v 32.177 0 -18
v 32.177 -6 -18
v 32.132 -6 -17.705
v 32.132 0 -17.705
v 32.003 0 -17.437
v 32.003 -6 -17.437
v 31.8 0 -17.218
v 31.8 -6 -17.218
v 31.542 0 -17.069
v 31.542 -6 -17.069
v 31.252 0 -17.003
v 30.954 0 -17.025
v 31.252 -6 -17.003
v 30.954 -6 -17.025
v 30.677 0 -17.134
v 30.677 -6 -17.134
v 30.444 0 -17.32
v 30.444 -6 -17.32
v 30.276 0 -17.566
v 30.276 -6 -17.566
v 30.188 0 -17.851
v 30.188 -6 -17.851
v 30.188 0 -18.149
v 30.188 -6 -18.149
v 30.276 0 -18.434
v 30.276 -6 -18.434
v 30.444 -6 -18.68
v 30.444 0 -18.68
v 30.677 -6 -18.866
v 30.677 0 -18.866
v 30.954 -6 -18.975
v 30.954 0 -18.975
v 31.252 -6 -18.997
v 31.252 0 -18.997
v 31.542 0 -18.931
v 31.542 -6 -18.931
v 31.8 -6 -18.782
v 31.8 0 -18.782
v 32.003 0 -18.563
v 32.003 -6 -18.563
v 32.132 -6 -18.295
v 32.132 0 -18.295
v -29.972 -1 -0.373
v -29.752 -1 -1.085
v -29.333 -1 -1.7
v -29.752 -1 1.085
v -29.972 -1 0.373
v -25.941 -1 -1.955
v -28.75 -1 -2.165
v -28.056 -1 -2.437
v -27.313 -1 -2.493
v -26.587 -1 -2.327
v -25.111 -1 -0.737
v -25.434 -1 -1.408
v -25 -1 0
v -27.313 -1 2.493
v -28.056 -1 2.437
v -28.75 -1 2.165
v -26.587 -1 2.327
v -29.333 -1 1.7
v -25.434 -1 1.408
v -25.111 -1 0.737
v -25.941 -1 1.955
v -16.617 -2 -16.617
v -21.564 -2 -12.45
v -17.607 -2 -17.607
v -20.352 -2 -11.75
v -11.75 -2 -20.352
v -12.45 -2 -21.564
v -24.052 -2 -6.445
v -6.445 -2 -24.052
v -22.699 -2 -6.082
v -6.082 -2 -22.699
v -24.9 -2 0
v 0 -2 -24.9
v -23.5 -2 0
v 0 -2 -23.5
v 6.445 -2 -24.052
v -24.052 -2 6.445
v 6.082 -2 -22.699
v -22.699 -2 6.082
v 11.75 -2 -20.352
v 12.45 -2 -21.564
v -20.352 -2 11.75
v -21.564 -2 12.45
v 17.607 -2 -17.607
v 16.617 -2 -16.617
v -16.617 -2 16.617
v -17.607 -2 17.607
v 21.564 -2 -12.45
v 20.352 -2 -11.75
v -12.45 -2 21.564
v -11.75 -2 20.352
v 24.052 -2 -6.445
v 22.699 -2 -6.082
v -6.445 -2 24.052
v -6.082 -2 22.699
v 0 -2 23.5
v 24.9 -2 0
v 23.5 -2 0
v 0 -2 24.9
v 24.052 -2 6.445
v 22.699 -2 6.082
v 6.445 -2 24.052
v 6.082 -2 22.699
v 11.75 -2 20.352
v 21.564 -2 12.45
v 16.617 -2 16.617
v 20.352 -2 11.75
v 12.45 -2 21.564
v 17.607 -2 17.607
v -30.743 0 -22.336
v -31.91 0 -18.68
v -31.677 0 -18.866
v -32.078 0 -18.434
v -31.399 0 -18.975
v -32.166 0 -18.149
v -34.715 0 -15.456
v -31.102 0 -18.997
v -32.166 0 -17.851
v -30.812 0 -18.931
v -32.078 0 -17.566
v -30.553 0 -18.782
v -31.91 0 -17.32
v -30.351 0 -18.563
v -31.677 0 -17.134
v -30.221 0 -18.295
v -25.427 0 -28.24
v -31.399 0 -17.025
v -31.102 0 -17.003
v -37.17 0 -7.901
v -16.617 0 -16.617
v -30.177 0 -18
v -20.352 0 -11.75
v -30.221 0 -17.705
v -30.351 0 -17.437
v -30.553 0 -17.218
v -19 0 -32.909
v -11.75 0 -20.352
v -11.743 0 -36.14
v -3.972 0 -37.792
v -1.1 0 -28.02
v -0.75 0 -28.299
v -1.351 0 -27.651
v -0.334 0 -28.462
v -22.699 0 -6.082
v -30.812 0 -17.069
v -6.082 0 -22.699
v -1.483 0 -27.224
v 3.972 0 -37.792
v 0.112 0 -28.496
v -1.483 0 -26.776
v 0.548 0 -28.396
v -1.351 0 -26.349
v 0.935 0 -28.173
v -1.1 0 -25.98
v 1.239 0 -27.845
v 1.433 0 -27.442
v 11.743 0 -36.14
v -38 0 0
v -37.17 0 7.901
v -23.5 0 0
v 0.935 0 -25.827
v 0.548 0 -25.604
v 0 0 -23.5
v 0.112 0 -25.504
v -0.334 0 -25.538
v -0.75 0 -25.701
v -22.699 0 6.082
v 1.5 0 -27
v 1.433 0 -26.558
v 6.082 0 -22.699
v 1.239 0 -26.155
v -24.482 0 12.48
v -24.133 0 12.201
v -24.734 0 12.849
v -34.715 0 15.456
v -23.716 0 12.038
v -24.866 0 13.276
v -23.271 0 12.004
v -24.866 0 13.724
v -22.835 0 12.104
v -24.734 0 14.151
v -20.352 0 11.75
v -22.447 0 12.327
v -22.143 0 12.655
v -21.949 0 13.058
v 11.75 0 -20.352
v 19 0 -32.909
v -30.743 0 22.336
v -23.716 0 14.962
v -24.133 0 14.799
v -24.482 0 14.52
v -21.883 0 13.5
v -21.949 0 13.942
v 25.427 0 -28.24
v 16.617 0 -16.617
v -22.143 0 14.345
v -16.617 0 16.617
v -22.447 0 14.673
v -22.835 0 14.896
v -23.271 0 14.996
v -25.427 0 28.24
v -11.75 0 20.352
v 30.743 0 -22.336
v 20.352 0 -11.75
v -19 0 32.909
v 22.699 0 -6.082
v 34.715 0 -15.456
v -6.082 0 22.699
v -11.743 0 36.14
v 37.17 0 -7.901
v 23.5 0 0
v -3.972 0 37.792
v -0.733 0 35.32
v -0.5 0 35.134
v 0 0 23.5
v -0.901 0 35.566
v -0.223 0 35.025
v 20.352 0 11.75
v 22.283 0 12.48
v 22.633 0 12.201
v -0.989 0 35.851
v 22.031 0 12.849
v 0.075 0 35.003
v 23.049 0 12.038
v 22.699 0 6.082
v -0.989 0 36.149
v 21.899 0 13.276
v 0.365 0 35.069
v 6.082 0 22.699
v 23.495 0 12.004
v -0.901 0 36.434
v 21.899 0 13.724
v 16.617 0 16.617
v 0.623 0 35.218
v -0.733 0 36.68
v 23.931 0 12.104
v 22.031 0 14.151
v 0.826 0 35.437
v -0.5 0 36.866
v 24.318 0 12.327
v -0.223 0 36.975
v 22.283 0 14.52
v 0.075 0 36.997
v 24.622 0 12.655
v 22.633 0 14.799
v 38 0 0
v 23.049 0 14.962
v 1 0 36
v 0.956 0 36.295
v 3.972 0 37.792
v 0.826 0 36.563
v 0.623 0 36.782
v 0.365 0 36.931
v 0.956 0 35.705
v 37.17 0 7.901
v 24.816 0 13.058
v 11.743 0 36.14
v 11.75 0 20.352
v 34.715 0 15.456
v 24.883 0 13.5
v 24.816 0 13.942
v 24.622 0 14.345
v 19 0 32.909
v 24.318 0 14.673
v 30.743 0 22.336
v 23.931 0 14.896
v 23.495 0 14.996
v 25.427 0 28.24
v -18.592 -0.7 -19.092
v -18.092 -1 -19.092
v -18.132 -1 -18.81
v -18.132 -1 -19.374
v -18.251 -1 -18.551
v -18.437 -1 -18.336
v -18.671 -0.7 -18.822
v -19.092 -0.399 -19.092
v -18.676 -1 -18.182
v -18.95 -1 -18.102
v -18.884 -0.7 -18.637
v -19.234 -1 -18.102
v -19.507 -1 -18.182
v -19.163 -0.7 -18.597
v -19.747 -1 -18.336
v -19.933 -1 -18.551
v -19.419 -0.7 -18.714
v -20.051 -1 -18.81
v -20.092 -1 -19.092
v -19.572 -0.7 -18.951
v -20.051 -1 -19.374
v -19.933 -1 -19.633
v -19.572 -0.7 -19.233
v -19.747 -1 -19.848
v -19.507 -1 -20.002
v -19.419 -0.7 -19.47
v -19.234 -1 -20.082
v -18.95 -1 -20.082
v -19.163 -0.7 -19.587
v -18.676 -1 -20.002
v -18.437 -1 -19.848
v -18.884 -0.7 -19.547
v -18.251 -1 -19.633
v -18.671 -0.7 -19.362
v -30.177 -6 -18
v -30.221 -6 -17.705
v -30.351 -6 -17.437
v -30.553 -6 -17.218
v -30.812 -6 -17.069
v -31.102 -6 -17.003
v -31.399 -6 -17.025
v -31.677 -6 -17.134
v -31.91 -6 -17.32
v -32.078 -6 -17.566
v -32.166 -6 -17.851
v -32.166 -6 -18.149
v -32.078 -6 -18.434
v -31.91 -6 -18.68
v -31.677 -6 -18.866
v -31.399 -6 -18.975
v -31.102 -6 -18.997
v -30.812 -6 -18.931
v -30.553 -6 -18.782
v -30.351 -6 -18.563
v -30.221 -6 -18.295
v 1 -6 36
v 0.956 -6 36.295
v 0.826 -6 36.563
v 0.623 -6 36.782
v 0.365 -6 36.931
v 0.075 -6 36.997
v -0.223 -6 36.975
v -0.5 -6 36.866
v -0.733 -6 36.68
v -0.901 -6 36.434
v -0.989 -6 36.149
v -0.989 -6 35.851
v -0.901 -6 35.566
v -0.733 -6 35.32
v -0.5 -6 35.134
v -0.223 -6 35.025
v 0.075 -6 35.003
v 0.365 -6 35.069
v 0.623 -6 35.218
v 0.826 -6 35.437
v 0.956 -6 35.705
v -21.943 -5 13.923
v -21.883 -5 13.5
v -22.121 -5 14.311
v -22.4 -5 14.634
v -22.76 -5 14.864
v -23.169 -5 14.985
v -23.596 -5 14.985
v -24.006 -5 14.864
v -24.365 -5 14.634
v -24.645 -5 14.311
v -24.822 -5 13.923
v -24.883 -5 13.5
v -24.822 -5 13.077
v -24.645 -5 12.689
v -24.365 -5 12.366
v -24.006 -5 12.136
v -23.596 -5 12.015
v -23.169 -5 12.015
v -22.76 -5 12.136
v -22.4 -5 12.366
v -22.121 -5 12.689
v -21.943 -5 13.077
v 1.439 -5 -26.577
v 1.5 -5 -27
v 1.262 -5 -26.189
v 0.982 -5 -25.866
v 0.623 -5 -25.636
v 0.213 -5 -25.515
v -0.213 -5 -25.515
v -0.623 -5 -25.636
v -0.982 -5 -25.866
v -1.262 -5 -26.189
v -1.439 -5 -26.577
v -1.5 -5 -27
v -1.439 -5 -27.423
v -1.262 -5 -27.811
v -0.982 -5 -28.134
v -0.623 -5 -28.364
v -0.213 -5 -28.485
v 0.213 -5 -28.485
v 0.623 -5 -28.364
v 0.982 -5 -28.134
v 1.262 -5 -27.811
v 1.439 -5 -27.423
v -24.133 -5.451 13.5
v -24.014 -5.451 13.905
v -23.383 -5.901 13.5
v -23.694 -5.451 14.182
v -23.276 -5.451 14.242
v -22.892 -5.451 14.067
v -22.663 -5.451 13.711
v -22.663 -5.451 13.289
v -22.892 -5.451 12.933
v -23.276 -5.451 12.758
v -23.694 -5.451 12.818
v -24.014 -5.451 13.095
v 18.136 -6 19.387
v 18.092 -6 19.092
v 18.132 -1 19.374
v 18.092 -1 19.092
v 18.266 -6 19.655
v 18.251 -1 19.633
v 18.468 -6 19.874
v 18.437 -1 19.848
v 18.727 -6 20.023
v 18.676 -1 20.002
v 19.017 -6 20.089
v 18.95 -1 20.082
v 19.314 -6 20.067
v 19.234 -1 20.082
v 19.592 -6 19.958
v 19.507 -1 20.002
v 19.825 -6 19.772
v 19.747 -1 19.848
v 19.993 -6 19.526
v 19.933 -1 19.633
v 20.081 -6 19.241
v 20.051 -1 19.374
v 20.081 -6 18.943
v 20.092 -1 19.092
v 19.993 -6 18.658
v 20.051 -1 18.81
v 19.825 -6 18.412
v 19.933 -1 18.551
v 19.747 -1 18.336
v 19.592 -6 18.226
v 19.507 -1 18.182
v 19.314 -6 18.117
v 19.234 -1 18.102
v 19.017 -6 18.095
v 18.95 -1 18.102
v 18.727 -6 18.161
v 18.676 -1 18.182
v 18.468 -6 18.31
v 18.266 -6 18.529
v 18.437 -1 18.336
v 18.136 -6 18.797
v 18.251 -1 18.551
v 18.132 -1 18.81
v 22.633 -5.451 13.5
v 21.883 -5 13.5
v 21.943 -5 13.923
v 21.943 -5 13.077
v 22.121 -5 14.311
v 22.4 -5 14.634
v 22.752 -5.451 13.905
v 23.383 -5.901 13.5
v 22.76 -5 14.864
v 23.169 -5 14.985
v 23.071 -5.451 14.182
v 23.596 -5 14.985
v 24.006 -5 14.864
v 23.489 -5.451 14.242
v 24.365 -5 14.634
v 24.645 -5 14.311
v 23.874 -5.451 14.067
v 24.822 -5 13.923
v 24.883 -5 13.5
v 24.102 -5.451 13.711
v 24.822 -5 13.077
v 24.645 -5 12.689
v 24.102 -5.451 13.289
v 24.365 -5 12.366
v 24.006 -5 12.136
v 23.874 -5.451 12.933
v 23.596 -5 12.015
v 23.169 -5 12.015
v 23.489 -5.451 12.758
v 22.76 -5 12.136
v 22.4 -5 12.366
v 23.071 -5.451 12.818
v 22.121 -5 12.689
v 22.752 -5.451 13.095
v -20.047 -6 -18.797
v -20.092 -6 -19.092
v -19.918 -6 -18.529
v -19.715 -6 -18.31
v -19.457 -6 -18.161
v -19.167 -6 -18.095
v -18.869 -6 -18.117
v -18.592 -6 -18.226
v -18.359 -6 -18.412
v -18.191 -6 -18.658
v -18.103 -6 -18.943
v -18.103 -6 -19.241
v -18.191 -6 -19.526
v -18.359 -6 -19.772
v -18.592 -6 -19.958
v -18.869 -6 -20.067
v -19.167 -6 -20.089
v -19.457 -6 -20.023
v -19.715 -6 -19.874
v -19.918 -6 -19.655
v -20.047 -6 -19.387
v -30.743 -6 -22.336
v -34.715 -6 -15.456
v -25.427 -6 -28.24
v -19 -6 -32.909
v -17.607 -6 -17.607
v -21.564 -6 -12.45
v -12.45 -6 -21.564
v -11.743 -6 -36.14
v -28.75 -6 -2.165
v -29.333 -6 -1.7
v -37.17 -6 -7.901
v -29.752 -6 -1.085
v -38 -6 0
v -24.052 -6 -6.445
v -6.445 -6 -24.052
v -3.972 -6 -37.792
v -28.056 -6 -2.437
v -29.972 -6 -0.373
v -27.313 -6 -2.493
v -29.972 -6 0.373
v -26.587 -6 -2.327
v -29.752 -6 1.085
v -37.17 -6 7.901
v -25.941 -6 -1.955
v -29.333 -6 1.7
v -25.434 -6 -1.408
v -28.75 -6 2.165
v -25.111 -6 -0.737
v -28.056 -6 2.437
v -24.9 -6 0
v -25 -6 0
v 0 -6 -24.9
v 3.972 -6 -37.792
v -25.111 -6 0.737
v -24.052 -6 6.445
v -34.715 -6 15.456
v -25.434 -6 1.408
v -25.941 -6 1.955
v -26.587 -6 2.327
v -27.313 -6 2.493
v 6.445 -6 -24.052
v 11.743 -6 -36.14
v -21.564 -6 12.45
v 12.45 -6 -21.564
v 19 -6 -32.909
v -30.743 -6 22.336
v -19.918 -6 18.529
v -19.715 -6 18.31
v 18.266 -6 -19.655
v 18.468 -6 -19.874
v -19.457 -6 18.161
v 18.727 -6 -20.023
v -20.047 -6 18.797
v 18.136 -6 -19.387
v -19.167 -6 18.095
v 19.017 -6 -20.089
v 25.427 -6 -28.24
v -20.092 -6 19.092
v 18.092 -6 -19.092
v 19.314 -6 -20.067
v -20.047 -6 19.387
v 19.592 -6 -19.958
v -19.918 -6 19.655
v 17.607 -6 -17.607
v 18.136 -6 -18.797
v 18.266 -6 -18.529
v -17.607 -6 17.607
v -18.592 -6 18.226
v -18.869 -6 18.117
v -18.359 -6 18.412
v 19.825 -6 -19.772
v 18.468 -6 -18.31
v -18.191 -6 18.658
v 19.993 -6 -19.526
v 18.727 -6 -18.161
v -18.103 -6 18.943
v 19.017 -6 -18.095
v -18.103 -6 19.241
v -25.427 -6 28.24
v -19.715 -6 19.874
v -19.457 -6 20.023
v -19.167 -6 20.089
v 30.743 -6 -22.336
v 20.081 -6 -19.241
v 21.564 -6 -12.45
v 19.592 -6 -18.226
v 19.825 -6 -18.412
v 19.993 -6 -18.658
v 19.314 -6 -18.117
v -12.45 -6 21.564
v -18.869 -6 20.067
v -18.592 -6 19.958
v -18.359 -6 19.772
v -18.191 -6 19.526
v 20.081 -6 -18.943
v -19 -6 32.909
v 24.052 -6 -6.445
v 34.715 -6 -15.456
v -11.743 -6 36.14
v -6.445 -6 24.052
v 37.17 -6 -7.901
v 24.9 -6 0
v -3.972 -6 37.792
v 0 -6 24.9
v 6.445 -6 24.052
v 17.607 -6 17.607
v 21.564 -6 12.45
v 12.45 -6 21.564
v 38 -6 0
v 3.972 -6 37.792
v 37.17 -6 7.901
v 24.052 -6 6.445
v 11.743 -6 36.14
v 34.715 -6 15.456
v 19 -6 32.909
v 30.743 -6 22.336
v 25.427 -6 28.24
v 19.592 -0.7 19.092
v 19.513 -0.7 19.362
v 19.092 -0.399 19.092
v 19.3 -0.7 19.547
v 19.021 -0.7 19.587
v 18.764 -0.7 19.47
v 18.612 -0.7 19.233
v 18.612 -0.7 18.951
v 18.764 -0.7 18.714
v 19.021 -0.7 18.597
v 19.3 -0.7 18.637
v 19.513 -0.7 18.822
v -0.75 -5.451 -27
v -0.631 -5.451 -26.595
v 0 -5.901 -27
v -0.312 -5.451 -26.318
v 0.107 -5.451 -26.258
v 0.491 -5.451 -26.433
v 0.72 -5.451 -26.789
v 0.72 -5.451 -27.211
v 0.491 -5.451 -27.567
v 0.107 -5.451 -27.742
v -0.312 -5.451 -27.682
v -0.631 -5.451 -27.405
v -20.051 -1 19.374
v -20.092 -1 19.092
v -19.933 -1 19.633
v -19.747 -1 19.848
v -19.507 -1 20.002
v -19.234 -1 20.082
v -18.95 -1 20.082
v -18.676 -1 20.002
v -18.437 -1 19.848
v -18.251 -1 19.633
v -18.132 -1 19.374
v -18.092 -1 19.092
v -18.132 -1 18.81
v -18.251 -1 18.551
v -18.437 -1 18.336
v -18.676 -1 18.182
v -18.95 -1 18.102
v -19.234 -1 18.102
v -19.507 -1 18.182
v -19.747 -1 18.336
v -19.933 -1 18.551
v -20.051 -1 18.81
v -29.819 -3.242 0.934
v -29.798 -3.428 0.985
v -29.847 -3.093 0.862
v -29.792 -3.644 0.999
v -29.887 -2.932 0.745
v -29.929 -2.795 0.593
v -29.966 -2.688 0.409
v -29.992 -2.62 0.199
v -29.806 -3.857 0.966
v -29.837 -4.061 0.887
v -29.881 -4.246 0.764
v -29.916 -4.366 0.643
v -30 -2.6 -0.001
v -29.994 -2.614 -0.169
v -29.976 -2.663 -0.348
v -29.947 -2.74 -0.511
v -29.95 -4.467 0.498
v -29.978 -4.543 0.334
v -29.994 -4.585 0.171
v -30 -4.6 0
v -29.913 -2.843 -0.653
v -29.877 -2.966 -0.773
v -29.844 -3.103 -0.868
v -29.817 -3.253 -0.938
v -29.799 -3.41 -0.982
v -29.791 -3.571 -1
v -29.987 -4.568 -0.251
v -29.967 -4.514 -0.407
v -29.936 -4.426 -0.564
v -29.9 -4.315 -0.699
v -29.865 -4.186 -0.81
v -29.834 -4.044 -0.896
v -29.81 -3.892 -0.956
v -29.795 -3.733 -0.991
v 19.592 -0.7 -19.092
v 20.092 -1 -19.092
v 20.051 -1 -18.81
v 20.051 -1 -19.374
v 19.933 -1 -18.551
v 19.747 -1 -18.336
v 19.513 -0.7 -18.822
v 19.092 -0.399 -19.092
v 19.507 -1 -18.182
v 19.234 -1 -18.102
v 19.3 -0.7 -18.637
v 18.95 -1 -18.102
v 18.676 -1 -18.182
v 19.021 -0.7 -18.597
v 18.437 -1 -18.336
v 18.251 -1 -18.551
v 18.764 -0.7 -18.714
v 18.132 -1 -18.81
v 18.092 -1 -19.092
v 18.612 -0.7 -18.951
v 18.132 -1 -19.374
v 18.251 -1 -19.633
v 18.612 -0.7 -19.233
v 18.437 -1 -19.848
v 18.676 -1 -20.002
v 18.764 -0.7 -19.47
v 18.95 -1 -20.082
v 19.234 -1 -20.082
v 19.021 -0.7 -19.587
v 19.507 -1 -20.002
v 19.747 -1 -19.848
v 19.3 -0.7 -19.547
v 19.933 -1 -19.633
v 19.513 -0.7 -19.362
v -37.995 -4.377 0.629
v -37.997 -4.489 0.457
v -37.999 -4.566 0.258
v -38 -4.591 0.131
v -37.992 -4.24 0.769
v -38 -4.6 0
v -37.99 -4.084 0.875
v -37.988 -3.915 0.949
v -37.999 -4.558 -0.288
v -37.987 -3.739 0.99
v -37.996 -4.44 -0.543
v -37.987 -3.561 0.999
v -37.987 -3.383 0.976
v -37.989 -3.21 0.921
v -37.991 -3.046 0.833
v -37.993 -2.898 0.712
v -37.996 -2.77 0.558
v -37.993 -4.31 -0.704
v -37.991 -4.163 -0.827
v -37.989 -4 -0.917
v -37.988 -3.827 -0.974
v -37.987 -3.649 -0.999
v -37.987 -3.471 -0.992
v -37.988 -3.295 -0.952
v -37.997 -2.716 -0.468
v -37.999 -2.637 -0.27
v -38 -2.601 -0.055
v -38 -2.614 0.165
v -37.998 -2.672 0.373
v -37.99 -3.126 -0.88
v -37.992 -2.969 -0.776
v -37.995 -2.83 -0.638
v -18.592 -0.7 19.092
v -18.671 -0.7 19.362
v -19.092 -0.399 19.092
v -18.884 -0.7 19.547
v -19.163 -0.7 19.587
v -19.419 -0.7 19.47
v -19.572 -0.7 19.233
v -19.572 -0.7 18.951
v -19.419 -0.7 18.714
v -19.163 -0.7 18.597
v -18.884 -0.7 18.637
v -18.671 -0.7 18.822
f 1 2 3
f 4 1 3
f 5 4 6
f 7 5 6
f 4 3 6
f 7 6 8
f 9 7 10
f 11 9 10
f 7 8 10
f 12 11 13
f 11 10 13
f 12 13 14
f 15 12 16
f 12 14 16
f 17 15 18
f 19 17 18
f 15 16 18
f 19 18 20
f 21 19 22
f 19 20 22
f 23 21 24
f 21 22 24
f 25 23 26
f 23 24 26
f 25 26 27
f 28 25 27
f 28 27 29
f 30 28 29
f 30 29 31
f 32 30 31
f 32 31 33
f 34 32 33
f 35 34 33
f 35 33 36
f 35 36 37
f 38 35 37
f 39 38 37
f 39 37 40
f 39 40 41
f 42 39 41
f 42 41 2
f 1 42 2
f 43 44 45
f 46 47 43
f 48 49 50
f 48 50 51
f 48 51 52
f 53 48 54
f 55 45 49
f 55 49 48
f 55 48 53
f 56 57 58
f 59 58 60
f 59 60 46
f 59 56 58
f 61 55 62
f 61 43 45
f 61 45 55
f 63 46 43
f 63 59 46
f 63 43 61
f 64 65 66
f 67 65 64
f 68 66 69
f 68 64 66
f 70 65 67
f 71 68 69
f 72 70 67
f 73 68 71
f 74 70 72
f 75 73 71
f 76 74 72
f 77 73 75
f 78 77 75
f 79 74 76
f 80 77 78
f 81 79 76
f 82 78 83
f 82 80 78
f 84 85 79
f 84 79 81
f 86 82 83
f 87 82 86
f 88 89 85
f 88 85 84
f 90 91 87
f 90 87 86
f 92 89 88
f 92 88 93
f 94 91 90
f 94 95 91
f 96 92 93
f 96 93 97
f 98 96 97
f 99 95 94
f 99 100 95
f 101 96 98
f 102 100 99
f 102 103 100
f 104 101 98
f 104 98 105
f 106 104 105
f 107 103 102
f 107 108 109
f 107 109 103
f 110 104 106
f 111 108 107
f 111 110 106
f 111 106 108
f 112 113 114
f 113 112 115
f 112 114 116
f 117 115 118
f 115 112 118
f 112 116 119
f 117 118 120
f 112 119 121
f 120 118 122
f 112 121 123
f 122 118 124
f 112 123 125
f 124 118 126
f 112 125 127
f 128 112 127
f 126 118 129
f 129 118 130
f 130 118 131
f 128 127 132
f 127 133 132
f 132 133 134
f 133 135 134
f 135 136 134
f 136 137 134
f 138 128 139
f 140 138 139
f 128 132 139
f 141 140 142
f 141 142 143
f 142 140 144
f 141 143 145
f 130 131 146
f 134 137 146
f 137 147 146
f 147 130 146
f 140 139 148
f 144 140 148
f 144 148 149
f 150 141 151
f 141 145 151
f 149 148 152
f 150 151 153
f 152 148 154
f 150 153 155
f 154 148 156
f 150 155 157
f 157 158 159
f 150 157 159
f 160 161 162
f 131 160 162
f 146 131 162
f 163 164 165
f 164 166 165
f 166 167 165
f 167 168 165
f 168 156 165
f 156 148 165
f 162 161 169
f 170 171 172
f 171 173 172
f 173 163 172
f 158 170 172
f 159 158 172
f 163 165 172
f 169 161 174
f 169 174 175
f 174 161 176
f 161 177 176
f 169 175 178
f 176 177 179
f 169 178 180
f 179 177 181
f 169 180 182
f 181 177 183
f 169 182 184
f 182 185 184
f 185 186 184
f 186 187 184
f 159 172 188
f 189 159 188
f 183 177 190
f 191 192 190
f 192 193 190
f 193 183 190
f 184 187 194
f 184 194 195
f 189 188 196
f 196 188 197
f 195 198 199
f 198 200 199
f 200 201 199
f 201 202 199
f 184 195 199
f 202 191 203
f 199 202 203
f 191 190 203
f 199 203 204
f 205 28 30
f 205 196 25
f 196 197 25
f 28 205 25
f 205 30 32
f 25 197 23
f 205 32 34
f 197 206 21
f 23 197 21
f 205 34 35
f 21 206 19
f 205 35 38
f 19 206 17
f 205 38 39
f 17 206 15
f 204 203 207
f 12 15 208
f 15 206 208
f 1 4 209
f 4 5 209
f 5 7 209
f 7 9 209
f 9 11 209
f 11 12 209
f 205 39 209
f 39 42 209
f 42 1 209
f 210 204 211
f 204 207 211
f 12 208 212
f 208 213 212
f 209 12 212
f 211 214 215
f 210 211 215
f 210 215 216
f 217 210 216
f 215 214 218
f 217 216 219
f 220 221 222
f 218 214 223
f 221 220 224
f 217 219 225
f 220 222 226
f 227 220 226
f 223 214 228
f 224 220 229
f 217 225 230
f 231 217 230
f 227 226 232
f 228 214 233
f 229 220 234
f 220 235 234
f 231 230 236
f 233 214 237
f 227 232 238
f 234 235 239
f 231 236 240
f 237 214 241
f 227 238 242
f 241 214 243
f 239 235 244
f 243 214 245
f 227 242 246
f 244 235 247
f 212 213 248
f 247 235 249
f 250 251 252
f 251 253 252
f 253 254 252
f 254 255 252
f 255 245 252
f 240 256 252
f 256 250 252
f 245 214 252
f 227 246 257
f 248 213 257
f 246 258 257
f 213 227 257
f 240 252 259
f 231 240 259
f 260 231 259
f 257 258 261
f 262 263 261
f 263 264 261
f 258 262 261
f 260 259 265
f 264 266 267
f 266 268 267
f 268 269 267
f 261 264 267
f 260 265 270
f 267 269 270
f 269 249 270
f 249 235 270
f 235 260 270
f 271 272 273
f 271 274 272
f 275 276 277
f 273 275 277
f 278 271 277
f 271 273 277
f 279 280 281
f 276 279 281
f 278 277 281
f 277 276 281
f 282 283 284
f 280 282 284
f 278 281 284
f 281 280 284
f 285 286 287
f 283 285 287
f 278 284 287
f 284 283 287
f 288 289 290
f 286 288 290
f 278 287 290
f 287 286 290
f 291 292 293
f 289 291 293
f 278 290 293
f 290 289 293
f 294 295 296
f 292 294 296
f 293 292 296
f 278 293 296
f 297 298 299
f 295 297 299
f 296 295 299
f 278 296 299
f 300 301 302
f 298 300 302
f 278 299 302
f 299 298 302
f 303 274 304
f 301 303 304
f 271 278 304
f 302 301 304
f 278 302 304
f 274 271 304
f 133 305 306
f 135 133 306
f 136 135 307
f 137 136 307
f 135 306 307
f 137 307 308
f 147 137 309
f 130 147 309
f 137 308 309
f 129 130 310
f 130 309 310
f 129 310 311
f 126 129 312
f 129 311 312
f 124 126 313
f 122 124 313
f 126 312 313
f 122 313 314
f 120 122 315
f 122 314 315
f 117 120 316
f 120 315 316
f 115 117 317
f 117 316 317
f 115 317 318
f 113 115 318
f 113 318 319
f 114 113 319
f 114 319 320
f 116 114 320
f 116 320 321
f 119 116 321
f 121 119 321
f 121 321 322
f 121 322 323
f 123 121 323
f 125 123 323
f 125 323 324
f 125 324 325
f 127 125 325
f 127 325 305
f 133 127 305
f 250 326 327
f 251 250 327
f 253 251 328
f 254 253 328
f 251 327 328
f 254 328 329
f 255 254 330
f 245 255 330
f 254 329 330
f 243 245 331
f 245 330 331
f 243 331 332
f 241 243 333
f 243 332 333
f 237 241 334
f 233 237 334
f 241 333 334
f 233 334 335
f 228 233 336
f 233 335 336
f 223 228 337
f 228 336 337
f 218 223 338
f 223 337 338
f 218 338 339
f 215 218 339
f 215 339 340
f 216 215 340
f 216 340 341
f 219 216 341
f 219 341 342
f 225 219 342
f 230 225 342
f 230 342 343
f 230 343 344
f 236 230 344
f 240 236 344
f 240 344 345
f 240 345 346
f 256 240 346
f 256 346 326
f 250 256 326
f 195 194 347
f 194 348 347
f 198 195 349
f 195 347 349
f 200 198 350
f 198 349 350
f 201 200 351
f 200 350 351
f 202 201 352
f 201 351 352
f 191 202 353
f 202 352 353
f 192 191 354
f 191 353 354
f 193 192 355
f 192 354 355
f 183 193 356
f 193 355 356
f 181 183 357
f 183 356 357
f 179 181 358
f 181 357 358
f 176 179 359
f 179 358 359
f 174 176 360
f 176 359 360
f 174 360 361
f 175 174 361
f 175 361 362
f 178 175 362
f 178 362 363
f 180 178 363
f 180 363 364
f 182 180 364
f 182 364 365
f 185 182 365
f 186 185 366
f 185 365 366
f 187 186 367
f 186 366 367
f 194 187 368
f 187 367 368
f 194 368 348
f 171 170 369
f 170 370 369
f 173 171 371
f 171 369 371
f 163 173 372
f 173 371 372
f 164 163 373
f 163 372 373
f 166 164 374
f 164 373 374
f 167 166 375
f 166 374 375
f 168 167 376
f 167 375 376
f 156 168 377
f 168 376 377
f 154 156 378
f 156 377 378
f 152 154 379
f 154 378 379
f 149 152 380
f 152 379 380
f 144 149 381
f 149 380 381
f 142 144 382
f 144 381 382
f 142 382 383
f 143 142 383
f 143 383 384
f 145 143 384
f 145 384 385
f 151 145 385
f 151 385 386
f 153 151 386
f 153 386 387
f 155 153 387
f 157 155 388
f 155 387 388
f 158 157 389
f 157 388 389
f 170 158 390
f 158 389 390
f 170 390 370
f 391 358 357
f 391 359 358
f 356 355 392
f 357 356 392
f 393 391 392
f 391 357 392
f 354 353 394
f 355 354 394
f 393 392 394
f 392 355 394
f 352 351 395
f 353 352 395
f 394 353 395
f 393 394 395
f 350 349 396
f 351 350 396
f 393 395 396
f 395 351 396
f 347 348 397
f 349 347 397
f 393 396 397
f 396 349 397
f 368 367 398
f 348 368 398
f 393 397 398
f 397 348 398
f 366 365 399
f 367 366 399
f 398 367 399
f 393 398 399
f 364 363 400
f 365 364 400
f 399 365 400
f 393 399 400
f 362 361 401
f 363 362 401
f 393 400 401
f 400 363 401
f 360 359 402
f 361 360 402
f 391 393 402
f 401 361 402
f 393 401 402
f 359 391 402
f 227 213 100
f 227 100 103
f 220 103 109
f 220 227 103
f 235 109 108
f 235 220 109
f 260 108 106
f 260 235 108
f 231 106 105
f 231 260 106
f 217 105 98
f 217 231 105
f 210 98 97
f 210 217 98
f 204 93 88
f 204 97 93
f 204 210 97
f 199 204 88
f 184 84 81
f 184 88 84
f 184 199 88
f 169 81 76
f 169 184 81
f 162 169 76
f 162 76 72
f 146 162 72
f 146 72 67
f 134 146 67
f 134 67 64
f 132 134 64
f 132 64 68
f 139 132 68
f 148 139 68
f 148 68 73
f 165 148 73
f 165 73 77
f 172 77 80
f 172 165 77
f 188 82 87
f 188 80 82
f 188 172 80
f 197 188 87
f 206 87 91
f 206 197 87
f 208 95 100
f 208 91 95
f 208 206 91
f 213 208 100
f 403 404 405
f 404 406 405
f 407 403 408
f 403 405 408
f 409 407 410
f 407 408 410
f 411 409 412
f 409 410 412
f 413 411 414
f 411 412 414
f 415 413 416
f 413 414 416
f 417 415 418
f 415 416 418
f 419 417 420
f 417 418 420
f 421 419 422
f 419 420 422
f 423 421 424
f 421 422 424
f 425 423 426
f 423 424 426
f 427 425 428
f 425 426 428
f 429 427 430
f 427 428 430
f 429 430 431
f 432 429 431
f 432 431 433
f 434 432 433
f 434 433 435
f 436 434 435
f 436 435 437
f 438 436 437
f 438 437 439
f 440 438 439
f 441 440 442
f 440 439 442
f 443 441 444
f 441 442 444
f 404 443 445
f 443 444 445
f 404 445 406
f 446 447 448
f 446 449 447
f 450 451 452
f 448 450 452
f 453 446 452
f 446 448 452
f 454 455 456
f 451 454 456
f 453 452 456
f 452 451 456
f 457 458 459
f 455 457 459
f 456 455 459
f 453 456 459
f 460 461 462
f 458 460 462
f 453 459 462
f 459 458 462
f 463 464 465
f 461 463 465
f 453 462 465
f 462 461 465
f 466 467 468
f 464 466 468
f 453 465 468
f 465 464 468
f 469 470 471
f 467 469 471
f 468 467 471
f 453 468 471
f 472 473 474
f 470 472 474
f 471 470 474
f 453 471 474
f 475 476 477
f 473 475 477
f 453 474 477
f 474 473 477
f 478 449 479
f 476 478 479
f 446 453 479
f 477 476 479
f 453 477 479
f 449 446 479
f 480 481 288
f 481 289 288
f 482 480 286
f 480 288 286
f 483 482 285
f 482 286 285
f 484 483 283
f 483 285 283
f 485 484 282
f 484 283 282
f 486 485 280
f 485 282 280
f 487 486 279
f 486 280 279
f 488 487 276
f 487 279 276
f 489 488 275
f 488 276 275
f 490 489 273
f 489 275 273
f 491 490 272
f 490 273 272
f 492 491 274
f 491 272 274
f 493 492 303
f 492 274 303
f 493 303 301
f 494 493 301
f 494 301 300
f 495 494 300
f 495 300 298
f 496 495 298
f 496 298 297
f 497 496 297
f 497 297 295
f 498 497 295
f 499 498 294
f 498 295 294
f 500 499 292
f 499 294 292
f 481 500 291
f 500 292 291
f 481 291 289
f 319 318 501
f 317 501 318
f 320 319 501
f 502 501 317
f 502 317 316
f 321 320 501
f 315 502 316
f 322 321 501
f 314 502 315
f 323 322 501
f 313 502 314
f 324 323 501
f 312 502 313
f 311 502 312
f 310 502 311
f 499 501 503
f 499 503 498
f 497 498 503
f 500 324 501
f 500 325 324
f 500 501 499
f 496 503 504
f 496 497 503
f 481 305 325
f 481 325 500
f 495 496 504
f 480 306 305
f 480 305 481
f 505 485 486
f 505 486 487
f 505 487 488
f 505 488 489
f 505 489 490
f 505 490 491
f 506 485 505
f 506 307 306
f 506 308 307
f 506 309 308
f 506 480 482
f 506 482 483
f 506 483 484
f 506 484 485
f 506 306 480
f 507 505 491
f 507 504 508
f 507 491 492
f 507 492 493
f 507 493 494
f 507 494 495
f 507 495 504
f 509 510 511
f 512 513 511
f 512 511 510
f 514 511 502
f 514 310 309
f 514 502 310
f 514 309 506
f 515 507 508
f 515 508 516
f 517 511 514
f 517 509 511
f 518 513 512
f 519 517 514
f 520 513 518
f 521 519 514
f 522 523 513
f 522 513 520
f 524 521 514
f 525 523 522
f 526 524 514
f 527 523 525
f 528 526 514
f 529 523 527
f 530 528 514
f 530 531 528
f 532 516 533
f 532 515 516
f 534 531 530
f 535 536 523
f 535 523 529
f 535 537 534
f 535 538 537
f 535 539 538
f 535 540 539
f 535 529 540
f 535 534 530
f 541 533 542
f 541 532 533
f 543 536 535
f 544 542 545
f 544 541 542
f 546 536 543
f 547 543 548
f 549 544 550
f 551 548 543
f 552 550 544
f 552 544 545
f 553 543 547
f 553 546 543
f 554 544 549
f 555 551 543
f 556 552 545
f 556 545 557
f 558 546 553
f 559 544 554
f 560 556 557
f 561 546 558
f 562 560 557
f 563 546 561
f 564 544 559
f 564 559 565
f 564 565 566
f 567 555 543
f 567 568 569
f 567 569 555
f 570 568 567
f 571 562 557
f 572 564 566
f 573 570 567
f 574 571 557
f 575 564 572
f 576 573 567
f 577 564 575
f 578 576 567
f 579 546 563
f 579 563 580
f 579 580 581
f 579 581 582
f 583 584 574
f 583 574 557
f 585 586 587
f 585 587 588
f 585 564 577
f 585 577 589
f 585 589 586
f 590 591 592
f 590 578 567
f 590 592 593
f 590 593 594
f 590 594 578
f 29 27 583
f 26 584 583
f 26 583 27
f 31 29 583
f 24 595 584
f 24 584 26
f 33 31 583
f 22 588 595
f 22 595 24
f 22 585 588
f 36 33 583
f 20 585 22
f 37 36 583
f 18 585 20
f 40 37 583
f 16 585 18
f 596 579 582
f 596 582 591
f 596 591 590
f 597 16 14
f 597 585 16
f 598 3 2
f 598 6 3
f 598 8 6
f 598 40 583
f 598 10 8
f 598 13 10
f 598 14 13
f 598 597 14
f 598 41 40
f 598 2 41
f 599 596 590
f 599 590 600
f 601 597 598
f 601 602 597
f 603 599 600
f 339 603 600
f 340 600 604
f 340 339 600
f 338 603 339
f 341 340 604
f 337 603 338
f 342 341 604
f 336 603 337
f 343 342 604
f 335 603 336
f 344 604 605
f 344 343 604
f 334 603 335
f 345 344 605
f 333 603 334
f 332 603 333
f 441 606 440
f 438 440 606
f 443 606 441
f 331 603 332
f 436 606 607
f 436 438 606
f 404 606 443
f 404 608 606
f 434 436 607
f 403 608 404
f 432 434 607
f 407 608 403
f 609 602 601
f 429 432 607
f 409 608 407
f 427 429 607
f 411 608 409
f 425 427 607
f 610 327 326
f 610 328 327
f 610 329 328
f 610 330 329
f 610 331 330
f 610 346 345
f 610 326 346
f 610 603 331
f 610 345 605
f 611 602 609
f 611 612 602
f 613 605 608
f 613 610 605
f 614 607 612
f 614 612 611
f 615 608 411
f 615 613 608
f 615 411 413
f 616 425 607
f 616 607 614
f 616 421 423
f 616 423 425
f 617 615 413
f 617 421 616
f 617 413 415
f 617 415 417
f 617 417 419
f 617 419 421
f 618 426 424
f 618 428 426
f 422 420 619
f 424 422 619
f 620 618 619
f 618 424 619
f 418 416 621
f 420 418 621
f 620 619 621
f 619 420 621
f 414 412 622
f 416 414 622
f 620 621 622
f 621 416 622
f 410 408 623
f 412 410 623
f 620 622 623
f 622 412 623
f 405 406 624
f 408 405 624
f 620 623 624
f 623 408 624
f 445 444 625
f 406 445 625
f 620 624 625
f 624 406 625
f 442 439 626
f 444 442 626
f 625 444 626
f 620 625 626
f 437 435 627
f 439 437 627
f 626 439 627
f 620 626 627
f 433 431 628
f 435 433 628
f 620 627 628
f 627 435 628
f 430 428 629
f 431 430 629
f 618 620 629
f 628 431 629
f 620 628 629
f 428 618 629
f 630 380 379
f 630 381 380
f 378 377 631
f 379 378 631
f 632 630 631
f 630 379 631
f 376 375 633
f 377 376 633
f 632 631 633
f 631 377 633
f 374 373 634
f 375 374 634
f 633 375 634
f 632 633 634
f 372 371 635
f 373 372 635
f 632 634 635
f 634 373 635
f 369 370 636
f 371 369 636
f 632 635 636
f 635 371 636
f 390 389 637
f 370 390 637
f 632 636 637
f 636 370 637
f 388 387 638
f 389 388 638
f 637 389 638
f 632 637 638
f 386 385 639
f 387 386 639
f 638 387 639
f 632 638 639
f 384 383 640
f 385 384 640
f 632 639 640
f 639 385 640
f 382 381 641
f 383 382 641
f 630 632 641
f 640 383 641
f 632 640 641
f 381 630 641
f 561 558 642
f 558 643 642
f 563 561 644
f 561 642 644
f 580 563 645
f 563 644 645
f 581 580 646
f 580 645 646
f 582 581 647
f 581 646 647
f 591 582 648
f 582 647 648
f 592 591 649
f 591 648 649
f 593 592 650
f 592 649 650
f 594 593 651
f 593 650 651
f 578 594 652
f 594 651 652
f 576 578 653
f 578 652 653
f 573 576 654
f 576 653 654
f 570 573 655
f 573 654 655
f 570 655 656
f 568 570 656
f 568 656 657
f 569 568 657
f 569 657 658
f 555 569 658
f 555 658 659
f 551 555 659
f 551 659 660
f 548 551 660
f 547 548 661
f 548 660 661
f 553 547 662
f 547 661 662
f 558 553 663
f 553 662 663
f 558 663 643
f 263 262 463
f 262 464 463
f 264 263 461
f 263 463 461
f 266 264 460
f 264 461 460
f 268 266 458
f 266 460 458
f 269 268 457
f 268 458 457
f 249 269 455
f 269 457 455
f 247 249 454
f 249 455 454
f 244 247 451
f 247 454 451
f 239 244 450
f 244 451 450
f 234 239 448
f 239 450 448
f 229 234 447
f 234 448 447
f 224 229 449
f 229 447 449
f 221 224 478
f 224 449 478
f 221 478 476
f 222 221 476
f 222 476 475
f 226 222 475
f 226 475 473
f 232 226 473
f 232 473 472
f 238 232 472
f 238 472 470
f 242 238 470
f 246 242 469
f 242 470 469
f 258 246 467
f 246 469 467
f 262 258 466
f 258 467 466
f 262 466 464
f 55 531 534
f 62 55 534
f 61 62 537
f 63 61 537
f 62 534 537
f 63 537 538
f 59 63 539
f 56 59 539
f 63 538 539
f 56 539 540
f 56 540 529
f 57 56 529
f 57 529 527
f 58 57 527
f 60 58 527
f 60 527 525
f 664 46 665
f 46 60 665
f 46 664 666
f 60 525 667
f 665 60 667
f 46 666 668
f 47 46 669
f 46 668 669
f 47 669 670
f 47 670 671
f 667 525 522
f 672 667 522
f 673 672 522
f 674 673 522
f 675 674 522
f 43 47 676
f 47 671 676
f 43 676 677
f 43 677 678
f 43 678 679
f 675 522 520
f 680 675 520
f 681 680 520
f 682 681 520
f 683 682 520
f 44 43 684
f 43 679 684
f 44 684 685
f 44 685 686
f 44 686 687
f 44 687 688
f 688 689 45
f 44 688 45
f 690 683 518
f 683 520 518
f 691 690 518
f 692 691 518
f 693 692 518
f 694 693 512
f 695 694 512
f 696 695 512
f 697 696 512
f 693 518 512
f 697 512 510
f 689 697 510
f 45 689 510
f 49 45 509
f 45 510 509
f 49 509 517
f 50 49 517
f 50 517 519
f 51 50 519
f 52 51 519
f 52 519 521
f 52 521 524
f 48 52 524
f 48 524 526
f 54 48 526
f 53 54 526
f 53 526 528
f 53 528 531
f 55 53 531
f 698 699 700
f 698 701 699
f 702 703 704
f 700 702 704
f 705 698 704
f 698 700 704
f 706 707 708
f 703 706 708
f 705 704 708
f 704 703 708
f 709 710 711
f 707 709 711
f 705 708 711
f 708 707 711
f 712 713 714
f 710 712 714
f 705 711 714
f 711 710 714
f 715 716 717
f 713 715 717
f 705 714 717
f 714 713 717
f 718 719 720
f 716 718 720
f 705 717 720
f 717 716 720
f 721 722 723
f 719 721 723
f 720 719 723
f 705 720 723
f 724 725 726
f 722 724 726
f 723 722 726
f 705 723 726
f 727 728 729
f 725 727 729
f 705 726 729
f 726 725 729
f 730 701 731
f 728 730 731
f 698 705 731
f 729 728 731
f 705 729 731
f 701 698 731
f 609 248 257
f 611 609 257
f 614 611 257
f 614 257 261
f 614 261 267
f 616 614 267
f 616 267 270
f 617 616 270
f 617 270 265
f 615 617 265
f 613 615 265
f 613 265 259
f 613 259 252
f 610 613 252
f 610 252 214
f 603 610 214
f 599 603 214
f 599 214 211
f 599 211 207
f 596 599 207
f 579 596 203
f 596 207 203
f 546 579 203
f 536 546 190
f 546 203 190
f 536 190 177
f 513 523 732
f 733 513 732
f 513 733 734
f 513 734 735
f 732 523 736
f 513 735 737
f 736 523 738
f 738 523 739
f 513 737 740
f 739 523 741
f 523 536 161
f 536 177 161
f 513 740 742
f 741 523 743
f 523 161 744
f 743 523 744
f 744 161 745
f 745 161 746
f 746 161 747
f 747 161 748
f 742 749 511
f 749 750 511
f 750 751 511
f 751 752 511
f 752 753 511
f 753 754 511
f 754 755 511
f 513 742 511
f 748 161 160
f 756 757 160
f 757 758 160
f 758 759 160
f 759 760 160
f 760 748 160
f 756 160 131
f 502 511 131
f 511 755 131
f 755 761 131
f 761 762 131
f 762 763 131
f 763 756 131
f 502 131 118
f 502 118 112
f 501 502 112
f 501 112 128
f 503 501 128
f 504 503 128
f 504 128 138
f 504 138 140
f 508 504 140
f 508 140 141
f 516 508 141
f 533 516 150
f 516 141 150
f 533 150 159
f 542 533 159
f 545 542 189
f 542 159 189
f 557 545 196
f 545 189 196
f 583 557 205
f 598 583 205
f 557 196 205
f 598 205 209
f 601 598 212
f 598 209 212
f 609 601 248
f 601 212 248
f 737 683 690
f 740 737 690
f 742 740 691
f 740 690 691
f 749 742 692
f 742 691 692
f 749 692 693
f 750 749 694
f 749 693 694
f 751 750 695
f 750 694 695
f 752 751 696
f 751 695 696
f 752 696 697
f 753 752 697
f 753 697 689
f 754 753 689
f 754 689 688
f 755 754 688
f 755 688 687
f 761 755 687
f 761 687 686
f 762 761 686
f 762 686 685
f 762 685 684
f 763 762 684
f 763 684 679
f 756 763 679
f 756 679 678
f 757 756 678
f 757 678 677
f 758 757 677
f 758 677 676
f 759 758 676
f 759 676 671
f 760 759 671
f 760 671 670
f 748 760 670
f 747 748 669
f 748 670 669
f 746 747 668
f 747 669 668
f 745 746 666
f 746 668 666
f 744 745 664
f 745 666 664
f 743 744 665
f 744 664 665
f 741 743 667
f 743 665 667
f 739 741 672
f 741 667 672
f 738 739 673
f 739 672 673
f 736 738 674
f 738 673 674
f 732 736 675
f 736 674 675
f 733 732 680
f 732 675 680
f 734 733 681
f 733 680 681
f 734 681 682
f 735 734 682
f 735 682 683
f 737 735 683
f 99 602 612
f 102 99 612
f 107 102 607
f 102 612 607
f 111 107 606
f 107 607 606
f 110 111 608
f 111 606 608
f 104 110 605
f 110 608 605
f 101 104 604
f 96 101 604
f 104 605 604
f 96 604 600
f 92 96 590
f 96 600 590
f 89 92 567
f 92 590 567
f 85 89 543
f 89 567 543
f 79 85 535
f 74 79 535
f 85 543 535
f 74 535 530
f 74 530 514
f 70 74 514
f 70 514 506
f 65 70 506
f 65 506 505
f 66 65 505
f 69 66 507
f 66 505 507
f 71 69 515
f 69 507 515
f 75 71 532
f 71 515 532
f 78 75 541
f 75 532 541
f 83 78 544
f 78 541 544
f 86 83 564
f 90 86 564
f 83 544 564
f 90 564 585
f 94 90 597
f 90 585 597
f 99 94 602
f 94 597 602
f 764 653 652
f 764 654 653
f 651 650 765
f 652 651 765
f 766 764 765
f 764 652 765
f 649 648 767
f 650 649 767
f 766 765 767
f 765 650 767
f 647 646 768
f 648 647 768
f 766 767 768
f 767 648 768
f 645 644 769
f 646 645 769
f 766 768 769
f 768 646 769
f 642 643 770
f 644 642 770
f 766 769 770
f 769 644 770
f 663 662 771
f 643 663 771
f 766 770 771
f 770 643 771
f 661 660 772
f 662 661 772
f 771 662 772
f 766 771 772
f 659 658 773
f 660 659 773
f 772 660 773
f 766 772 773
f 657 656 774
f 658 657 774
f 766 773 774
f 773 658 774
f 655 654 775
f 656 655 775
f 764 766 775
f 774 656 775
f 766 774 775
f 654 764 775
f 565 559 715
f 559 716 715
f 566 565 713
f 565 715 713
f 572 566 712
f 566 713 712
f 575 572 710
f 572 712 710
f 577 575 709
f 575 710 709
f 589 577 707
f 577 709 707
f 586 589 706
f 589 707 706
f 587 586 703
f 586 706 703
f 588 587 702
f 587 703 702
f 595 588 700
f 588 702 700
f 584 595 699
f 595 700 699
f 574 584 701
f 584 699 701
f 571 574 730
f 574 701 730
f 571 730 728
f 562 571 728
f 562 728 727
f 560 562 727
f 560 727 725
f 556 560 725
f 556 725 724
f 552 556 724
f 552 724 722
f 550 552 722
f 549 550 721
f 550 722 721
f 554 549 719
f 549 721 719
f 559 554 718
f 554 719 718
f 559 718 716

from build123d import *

# Parameters (mm, degrees)
F0_R      = 38
F0_R_2    = 23.5
F1_DEPTH  = 6
F2_R      = 24.9
F3_DEPTH  = 4
F5_D      = 3
F5_DEPTH  = 5
F5_TIP    = 0.9012909285
F6_D      = 2
F8_D      = 2
F8_DEPTH  = 5
F8_TIP    = 0.600860619
F9_R      = 2.5
F10_DEPTH = 5
F13_D     = 2
F13_DEPTH = 10
F13_START = 2.0131603
F13_TIP   = 0.600860619


with BuildPart() as f1:
    # F0 (on Front) → F1 (new body)
    with BuildSketch(Plane.XZ):
        Circle(F0_R)
        Circle(F0_R_2, mode=Mode.SUBTRACT)
    extrude(amount=F1_DEPTH)

    # F2 (on face) → F3 (cut)
    with BuildSketch(Plane.XZ.offset(6)):
        Circle(F2_R)
    extrude(amount=-F3_DEPTH, mode=Mode.SUBTRACT)

    # F5
    with Locations(Plane(origin=(0, 0, 0), x_dir=(-1, 0, 0), z_dir=(0, 1, 0))):
        with Locations((23.3826859022, 13.5), (-23.3826859022, 13.5), (0, -27)):
            Hole(F5_D / 2, depth=F5_DEPTH)
            with Locations((0, 0, -(F5_DEPTH + F5_TIP / 2))):  # 118° drill point
                Cone(0, F5_D / 2, F5_TIP, mode=Mode.SUBTRACT)

    # F6 (through all)
    with Locations(Plane(origin=(0, 0, 0), x_dir=(-1, 0, 0), z_dir=(0, 1, 0))):
        with Locations((0, 36), (-31.1769145362, -18), (31.1769145362, -18)):
            Hole(F6_D / 2)

    # F8
    with Locations(Plane.XZ.offset(6)):
        with Locations((-19.091883092, 19.091883092), (-19.091883092, -19.091883092), (19.091883092, -19.091883092), (19.091883092, 19.091883092)):
            Hole(F8_D / 2, depth=F8_DEPTH)
            with Locations((0, 0, -(F8_DEPTH + F8_TIP / 2))):  # 118° drill point
                Cone(0, F8_D / 2, F8_TIP, mode=Mode.SUBTRACT)

    # F9 (on face) → F10 (cut)
    with BuildSketch(Plane.XZ.offset(6)):
        with Locations((-27.5, 0)):
            Circle(F9_R)
    extrude(amount=-F10_DEPTH, mode=Mode.SUBTRACT)

    # F13
    # its depths count from where the whole tool has entered the part; down to there all is cleared
    with Locations(Plane(origin=(-40, 0, 0), x_dir=(0, 1, 0), z_dir=(-1, 0, 0)).offset(-F13_START)):
        with Locations((-3.6, 0)):
            Hole(F13_D / 2, depth=F13_DEPTH)
            with Locations((0, 0, -(F13_DEPTH + F13_TIP / 2))):  # 118° drill point
                Cone(0, F13_D / 2, F13_TIP, mode=Mode.SUBTRACT)


solid = f1.part
